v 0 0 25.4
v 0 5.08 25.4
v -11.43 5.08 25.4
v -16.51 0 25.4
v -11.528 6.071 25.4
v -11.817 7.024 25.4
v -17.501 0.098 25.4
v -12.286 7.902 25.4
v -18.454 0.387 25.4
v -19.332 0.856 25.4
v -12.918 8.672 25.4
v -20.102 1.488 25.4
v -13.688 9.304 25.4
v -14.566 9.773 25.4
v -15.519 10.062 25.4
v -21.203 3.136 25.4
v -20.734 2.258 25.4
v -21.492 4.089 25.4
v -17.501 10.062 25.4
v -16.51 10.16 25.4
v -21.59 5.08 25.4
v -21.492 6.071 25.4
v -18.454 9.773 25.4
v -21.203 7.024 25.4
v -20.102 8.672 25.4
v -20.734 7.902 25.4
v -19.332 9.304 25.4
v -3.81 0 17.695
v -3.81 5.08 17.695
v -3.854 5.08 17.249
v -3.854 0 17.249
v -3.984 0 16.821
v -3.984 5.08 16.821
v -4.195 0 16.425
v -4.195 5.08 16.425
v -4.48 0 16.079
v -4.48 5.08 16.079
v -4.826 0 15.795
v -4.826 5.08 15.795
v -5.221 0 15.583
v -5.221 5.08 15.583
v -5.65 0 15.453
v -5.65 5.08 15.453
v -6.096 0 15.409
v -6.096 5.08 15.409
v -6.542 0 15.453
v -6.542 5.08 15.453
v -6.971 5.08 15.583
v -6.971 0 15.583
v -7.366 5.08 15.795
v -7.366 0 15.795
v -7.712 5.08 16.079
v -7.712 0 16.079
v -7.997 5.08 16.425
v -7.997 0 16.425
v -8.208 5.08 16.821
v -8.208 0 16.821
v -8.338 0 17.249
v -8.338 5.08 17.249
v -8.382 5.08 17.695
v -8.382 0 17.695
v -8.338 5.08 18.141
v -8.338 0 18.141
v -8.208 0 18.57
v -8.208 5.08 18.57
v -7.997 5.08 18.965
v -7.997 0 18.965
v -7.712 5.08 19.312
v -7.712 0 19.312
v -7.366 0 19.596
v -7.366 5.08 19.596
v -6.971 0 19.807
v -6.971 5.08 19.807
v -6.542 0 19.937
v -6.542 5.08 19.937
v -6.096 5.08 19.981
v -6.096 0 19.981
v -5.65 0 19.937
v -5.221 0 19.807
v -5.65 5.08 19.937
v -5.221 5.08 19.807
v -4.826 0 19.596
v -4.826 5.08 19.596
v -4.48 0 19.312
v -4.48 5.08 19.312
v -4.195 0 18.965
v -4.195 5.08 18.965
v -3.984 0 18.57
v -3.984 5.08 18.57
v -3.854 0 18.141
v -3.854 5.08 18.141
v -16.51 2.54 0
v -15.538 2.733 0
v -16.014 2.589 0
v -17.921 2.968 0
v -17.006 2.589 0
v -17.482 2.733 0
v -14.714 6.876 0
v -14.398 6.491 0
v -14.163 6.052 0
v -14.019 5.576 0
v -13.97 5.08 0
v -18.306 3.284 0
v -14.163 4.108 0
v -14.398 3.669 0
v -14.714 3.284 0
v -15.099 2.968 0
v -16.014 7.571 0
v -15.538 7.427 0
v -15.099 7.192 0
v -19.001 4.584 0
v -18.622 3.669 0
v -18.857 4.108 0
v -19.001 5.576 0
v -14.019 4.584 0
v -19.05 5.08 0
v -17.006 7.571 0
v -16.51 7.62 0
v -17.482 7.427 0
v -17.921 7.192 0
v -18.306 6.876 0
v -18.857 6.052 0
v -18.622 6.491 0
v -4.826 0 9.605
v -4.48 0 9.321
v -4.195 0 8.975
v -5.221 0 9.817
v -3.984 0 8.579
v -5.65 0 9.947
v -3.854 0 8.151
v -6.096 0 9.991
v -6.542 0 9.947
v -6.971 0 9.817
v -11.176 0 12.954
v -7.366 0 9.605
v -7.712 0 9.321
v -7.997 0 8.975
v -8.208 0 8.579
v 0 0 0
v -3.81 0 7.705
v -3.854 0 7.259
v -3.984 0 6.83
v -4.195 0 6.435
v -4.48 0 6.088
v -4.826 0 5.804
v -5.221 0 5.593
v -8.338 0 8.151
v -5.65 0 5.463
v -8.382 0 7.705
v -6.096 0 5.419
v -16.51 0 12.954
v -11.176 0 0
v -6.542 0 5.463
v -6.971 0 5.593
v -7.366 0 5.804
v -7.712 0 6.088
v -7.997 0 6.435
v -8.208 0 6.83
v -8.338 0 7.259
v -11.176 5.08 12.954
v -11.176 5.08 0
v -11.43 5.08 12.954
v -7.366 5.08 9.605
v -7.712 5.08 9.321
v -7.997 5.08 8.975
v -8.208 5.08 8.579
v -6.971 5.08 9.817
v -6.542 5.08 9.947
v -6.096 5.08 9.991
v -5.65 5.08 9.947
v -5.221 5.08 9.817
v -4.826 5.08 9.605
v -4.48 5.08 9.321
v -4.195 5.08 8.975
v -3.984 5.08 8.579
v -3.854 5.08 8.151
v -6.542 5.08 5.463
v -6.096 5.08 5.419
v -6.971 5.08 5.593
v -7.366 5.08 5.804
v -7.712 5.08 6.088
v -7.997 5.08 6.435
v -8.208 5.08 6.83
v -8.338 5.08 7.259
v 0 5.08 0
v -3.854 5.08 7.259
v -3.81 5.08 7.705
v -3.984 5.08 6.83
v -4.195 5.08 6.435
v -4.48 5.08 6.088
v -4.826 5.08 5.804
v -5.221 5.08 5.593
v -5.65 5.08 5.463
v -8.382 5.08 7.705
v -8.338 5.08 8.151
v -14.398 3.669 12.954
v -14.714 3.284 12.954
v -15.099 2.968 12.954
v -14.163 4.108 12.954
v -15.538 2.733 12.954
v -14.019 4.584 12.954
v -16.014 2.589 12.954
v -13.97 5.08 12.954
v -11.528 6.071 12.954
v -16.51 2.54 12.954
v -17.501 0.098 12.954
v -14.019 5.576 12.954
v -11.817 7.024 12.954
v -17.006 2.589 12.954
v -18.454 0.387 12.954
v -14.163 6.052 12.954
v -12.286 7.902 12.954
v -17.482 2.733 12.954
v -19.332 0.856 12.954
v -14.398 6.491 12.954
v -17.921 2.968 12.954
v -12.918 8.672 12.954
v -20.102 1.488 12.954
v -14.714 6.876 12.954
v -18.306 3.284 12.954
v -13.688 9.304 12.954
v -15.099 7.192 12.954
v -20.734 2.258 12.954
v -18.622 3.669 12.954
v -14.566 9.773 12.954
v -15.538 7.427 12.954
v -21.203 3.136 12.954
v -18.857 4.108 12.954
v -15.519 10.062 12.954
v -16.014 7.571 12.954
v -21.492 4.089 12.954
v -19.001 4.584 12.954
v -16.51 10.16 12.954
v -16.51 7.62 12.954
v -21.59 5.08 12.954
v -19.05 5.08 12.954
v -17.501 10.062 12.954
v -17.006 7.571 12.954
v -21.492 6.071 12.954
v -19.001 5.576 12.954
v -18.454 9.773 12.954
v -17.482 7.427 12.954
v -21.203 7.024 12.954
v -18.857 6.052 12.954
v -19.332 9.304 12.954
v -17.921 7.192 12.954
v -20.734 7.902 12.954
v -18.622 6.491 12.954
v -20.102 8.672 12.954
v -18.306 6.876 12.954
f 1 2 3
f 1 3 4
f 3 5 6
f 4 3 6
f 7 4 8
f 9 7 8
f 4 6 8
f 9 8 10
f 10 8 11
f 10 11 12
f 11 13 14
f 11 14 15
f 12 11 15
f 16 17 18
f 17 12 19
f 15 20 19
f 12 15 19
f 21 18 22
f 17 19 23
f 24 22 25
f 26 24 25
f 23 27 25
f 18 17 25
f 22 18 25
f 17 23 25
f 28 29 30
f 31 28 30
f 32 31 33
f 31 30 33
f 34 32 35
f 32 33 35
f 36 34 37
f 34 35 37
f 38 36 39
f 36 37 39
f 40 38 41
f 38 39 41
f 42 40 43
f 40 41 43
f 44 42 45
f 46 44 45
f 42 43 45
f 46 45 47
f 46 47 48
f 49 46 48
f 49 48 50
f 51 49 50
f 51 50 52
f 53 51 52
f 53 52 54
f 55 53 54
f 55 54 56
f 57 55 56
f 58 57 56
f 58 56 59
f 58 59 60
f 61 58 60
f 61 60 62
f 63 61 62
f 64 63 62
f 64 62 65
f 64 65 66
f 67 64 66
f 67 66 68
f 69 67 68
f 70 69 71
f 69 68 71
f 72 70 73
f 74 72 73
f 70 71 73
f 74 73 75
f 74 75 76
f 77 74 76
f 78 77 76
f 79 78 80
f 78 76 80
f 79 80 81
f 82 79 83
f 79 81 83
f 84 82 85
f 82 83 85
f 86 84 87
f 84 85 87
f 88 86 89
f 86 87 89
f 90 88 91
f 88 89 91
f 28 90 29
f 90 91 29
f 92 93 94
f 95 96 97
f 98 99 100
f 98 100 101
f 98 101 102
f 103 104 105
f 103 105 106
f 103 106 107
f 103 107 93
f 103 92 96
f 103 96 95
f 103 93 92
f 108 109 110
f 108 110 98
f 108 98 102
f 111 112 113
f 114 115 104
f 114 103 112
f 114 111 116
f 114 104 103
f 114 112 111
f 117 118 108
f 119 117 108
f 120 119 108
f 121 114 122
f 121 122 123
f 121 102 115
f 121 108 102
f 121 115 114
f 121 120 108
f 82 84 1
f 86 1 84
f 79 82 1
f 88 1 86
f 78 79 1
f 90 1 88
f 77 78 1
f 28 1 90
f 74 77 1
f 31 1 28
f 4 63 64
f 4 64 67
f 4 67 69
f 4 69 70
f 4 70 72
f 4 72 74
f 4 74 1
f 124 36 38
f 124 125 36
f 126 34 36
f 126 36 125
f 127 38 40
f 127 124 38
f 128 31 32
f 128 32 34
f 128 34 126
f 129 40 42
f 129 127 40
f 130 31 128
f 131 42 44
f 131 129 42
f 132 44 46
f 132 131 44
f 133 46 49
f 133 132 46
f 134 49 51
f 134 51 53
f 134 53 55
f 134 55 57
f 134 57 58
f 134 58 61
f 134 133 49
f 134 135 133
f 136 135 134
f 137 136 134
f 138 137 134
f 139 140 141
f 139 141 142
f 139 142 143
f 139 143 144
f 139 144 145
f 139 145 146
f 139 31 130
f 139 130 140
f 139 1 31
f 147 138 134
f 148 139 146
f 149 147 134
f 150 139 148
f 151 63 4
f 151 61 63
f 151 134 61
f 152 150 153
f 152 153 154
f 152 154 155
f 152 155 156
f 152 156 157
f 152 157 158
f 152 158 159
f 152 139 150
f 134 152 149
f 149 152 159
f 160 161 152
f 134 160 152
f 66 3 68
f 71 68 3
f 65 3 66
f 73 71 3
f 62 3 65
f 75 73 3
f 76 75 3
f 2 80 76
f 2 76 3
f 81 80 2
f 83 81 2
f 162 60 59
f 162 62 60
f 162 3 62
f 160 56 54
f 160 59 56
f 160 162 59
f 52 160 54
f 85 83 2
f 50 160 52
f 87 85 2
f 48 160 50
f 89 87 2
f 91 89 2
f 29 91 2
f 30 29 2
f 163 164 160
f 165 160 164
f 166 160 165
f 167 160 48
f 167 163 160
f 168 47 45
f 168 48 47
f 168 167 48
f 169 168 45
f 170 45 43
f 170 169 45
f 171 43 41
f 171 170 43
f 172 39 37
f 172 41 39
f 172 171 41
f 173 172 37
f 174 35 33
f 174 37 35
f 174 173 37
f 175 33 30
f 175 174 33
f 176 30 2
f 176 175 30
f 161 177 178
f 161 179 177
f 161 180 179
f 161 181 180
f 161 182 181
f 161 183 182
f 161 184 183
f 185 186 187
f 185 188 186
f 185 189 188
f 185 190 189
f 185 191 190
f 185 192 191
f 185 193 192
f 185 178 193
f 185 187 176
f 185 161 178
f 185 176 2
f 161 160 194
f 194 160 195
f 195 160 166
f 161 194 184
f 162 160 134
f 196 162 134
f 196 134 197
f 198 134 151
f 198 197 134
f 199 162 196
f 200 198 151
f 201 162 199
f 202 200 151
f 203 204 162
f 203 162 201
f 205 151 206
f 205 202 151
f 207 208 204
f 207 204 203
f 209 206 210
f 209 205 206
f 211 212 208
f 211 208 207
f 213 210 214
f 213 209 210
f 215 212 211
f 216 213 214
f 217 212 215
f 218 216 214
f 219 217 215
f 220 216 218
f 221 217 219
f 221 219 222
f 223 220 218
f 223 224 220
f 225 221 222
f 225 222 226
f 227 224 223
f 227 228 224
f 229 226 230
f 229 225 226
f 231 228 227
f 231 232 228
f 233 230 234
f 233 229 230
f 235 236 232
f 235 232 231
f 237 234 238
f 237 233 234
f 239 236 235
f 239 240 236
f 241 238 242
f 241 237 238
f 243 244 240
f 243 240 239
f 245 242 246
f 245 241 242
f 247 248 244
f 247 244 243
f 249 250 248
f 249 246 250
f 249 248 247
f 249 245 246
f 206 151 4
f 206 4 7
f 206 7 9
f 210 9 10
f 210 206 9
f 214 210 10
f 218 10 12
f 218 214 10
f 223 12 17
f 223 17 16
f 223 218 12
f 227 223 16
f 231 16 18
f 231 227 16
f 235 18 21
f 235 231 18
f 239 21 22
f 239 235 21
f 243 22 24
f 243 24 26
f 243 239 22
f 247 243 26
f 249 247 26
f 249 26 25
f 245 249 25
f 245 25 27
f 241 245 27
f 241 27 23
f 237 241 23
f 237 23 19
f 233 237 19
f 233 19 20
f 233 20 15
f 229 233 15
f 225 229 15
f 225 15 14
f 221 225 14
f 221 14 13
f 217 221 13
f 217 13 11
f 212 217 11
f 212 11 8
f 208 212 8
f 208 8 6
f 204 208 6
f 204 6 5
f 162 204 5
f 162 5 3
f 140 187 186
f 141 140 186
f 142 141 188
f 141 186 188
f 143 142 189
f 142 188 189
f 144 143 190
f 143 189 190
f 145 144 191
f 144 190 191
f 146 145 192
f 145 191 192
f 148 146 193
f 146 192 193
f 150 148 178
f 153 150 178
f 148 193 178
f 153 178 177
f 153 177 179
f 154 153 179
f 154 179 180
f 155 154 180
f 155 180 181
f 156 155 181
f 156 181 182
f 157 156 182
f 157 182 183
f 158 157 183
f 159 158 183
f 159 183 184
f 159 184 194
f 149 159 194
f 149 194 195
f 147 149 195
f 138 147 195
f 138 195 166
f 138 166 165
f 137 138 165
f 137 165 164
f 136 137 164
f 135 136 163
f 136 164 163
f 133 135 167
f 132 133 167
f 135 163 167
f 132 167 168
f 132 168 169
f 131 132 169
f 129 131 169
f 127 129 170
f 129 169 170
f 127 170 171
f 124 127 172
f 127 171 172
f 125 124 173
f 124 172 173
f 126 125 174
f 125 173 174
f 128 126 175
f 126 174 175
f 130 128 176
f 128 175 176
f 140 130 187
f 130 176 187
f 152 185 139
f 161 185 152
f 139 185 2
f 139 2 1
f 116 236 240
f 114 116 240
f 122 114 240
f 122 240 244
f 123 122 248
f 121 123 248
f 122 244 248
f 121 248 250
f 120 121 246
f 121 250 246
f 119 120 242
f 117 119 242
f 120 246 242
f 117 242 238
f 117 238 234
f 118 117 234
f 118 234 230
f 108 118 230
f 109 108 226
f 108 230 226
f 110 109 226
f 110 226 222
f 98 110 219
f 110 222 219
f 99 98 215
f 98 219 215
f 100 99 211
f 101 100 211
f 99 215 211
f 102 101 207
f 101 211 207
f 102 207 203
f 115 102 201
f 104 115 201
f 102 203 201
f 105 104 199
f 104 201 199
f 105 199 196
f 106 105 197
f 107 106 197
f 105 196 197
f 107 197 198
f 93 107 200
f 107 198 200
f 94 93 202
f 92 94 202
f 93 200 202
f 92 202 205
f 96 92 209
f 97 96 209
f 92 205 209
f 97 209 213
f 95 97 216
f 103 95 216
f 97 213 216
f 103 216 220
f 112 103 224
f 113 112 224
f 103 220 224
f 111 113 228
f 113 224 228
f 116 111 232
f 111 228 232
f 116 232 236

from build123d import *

# Parameters (mm, degrees)
BOSS_EXTRUDE1_DEPTH = 25.4
SKETCH5_R           = 2.286
CUT_EXTRUDE3_DEPTH  = 12.954
SKETCH8_R           = 5.334
CUT_EXTRUDE5_DEPTH  = 12.954
SKETCH9_R           = 2.54
BOSS_EXTRUDE2_DEPTH = 12.954
CUT_EXTRUDE7_DEPTH  = 12.954


with BuildPart() as part:
    # Sketch2 → Boss-Extrude1 (new body)
    with BuildSketch(Plane.XY):
        with BuildLine():
            Line((0, 0), (-16.51, 0))
            ThreePointArc((-16.51, 0), (-20.102102448, 8.672102448), (-11.43, 5.08))
            Line((-11.43, 5.08), (0, 5.08))
            Line((0, 5.08), (0, 0))
        make_face()
    extrude(amount=BOSS_EXTRUDE1_DEPTH)

    # Sketch5 → Cut-Extrude3 (cut)
    with BuildSketch(Plane(origin=(0, 5.08, 0), x_dir=(1, 0, 0), z_dir=(0, 1, 0))):
        with Locations((-6.096, -17.695333333)):
            Circle(SKETCH5_R)
        with Locations((-6.096, -7.704666667)):
            Circle(SKETCH5_R)
    extrude(amount=-CUT_EXTRUDE3_DEPTH, mode=Mode.SUBTRACT)

    # Sketch8 → Cut-Extrude5 (cut)
    with BuildSketch(Plane(origin=(0, 0, 0), x_dir=(-1, 0, 0), z_dir=(0, 0, -1))):
        with Locations((16.51, 5.08)):
            Circle(SKETCH8_R)
    extrude(amount=-CUT_EXTRUDE5_DEPTH, mode=Mode.SUBTRACT)

    # Sketch9 → Boss-Extrude2 (add)
    with BuildSketch(Plane(origin=(0, 0, 12.954), x_dir=(-1, 0, 0), z_dir=(0, 0, -1))):
        with Locations((16.51, 5.08)):
            Circle(SKETCH9_R)
    extrude(amount=BOSS_EXTRUDE2_DEPTH)

    # Sketch10 → Cut-Extrude7 (cut)
    with BuildSketch(Plane(origin=(0, 0, 0), x_dir=(-1, 0, 0), z_dir=(0, 0, -1))):
        with BuildLine():
            Line((11.176, 5.08), (11.176, 0))
            Line((11.176, 0), (14.883606444, 0))
            ThreePointArc((14.883606444, 0), (12.201477096, 1.935451322), (11.176, 5.08))
        make_face()
    extrude(amount=-CUT_EXTRUDE7_DEPTH, mode=Mode.SUBTRACT)


solid = part.part
